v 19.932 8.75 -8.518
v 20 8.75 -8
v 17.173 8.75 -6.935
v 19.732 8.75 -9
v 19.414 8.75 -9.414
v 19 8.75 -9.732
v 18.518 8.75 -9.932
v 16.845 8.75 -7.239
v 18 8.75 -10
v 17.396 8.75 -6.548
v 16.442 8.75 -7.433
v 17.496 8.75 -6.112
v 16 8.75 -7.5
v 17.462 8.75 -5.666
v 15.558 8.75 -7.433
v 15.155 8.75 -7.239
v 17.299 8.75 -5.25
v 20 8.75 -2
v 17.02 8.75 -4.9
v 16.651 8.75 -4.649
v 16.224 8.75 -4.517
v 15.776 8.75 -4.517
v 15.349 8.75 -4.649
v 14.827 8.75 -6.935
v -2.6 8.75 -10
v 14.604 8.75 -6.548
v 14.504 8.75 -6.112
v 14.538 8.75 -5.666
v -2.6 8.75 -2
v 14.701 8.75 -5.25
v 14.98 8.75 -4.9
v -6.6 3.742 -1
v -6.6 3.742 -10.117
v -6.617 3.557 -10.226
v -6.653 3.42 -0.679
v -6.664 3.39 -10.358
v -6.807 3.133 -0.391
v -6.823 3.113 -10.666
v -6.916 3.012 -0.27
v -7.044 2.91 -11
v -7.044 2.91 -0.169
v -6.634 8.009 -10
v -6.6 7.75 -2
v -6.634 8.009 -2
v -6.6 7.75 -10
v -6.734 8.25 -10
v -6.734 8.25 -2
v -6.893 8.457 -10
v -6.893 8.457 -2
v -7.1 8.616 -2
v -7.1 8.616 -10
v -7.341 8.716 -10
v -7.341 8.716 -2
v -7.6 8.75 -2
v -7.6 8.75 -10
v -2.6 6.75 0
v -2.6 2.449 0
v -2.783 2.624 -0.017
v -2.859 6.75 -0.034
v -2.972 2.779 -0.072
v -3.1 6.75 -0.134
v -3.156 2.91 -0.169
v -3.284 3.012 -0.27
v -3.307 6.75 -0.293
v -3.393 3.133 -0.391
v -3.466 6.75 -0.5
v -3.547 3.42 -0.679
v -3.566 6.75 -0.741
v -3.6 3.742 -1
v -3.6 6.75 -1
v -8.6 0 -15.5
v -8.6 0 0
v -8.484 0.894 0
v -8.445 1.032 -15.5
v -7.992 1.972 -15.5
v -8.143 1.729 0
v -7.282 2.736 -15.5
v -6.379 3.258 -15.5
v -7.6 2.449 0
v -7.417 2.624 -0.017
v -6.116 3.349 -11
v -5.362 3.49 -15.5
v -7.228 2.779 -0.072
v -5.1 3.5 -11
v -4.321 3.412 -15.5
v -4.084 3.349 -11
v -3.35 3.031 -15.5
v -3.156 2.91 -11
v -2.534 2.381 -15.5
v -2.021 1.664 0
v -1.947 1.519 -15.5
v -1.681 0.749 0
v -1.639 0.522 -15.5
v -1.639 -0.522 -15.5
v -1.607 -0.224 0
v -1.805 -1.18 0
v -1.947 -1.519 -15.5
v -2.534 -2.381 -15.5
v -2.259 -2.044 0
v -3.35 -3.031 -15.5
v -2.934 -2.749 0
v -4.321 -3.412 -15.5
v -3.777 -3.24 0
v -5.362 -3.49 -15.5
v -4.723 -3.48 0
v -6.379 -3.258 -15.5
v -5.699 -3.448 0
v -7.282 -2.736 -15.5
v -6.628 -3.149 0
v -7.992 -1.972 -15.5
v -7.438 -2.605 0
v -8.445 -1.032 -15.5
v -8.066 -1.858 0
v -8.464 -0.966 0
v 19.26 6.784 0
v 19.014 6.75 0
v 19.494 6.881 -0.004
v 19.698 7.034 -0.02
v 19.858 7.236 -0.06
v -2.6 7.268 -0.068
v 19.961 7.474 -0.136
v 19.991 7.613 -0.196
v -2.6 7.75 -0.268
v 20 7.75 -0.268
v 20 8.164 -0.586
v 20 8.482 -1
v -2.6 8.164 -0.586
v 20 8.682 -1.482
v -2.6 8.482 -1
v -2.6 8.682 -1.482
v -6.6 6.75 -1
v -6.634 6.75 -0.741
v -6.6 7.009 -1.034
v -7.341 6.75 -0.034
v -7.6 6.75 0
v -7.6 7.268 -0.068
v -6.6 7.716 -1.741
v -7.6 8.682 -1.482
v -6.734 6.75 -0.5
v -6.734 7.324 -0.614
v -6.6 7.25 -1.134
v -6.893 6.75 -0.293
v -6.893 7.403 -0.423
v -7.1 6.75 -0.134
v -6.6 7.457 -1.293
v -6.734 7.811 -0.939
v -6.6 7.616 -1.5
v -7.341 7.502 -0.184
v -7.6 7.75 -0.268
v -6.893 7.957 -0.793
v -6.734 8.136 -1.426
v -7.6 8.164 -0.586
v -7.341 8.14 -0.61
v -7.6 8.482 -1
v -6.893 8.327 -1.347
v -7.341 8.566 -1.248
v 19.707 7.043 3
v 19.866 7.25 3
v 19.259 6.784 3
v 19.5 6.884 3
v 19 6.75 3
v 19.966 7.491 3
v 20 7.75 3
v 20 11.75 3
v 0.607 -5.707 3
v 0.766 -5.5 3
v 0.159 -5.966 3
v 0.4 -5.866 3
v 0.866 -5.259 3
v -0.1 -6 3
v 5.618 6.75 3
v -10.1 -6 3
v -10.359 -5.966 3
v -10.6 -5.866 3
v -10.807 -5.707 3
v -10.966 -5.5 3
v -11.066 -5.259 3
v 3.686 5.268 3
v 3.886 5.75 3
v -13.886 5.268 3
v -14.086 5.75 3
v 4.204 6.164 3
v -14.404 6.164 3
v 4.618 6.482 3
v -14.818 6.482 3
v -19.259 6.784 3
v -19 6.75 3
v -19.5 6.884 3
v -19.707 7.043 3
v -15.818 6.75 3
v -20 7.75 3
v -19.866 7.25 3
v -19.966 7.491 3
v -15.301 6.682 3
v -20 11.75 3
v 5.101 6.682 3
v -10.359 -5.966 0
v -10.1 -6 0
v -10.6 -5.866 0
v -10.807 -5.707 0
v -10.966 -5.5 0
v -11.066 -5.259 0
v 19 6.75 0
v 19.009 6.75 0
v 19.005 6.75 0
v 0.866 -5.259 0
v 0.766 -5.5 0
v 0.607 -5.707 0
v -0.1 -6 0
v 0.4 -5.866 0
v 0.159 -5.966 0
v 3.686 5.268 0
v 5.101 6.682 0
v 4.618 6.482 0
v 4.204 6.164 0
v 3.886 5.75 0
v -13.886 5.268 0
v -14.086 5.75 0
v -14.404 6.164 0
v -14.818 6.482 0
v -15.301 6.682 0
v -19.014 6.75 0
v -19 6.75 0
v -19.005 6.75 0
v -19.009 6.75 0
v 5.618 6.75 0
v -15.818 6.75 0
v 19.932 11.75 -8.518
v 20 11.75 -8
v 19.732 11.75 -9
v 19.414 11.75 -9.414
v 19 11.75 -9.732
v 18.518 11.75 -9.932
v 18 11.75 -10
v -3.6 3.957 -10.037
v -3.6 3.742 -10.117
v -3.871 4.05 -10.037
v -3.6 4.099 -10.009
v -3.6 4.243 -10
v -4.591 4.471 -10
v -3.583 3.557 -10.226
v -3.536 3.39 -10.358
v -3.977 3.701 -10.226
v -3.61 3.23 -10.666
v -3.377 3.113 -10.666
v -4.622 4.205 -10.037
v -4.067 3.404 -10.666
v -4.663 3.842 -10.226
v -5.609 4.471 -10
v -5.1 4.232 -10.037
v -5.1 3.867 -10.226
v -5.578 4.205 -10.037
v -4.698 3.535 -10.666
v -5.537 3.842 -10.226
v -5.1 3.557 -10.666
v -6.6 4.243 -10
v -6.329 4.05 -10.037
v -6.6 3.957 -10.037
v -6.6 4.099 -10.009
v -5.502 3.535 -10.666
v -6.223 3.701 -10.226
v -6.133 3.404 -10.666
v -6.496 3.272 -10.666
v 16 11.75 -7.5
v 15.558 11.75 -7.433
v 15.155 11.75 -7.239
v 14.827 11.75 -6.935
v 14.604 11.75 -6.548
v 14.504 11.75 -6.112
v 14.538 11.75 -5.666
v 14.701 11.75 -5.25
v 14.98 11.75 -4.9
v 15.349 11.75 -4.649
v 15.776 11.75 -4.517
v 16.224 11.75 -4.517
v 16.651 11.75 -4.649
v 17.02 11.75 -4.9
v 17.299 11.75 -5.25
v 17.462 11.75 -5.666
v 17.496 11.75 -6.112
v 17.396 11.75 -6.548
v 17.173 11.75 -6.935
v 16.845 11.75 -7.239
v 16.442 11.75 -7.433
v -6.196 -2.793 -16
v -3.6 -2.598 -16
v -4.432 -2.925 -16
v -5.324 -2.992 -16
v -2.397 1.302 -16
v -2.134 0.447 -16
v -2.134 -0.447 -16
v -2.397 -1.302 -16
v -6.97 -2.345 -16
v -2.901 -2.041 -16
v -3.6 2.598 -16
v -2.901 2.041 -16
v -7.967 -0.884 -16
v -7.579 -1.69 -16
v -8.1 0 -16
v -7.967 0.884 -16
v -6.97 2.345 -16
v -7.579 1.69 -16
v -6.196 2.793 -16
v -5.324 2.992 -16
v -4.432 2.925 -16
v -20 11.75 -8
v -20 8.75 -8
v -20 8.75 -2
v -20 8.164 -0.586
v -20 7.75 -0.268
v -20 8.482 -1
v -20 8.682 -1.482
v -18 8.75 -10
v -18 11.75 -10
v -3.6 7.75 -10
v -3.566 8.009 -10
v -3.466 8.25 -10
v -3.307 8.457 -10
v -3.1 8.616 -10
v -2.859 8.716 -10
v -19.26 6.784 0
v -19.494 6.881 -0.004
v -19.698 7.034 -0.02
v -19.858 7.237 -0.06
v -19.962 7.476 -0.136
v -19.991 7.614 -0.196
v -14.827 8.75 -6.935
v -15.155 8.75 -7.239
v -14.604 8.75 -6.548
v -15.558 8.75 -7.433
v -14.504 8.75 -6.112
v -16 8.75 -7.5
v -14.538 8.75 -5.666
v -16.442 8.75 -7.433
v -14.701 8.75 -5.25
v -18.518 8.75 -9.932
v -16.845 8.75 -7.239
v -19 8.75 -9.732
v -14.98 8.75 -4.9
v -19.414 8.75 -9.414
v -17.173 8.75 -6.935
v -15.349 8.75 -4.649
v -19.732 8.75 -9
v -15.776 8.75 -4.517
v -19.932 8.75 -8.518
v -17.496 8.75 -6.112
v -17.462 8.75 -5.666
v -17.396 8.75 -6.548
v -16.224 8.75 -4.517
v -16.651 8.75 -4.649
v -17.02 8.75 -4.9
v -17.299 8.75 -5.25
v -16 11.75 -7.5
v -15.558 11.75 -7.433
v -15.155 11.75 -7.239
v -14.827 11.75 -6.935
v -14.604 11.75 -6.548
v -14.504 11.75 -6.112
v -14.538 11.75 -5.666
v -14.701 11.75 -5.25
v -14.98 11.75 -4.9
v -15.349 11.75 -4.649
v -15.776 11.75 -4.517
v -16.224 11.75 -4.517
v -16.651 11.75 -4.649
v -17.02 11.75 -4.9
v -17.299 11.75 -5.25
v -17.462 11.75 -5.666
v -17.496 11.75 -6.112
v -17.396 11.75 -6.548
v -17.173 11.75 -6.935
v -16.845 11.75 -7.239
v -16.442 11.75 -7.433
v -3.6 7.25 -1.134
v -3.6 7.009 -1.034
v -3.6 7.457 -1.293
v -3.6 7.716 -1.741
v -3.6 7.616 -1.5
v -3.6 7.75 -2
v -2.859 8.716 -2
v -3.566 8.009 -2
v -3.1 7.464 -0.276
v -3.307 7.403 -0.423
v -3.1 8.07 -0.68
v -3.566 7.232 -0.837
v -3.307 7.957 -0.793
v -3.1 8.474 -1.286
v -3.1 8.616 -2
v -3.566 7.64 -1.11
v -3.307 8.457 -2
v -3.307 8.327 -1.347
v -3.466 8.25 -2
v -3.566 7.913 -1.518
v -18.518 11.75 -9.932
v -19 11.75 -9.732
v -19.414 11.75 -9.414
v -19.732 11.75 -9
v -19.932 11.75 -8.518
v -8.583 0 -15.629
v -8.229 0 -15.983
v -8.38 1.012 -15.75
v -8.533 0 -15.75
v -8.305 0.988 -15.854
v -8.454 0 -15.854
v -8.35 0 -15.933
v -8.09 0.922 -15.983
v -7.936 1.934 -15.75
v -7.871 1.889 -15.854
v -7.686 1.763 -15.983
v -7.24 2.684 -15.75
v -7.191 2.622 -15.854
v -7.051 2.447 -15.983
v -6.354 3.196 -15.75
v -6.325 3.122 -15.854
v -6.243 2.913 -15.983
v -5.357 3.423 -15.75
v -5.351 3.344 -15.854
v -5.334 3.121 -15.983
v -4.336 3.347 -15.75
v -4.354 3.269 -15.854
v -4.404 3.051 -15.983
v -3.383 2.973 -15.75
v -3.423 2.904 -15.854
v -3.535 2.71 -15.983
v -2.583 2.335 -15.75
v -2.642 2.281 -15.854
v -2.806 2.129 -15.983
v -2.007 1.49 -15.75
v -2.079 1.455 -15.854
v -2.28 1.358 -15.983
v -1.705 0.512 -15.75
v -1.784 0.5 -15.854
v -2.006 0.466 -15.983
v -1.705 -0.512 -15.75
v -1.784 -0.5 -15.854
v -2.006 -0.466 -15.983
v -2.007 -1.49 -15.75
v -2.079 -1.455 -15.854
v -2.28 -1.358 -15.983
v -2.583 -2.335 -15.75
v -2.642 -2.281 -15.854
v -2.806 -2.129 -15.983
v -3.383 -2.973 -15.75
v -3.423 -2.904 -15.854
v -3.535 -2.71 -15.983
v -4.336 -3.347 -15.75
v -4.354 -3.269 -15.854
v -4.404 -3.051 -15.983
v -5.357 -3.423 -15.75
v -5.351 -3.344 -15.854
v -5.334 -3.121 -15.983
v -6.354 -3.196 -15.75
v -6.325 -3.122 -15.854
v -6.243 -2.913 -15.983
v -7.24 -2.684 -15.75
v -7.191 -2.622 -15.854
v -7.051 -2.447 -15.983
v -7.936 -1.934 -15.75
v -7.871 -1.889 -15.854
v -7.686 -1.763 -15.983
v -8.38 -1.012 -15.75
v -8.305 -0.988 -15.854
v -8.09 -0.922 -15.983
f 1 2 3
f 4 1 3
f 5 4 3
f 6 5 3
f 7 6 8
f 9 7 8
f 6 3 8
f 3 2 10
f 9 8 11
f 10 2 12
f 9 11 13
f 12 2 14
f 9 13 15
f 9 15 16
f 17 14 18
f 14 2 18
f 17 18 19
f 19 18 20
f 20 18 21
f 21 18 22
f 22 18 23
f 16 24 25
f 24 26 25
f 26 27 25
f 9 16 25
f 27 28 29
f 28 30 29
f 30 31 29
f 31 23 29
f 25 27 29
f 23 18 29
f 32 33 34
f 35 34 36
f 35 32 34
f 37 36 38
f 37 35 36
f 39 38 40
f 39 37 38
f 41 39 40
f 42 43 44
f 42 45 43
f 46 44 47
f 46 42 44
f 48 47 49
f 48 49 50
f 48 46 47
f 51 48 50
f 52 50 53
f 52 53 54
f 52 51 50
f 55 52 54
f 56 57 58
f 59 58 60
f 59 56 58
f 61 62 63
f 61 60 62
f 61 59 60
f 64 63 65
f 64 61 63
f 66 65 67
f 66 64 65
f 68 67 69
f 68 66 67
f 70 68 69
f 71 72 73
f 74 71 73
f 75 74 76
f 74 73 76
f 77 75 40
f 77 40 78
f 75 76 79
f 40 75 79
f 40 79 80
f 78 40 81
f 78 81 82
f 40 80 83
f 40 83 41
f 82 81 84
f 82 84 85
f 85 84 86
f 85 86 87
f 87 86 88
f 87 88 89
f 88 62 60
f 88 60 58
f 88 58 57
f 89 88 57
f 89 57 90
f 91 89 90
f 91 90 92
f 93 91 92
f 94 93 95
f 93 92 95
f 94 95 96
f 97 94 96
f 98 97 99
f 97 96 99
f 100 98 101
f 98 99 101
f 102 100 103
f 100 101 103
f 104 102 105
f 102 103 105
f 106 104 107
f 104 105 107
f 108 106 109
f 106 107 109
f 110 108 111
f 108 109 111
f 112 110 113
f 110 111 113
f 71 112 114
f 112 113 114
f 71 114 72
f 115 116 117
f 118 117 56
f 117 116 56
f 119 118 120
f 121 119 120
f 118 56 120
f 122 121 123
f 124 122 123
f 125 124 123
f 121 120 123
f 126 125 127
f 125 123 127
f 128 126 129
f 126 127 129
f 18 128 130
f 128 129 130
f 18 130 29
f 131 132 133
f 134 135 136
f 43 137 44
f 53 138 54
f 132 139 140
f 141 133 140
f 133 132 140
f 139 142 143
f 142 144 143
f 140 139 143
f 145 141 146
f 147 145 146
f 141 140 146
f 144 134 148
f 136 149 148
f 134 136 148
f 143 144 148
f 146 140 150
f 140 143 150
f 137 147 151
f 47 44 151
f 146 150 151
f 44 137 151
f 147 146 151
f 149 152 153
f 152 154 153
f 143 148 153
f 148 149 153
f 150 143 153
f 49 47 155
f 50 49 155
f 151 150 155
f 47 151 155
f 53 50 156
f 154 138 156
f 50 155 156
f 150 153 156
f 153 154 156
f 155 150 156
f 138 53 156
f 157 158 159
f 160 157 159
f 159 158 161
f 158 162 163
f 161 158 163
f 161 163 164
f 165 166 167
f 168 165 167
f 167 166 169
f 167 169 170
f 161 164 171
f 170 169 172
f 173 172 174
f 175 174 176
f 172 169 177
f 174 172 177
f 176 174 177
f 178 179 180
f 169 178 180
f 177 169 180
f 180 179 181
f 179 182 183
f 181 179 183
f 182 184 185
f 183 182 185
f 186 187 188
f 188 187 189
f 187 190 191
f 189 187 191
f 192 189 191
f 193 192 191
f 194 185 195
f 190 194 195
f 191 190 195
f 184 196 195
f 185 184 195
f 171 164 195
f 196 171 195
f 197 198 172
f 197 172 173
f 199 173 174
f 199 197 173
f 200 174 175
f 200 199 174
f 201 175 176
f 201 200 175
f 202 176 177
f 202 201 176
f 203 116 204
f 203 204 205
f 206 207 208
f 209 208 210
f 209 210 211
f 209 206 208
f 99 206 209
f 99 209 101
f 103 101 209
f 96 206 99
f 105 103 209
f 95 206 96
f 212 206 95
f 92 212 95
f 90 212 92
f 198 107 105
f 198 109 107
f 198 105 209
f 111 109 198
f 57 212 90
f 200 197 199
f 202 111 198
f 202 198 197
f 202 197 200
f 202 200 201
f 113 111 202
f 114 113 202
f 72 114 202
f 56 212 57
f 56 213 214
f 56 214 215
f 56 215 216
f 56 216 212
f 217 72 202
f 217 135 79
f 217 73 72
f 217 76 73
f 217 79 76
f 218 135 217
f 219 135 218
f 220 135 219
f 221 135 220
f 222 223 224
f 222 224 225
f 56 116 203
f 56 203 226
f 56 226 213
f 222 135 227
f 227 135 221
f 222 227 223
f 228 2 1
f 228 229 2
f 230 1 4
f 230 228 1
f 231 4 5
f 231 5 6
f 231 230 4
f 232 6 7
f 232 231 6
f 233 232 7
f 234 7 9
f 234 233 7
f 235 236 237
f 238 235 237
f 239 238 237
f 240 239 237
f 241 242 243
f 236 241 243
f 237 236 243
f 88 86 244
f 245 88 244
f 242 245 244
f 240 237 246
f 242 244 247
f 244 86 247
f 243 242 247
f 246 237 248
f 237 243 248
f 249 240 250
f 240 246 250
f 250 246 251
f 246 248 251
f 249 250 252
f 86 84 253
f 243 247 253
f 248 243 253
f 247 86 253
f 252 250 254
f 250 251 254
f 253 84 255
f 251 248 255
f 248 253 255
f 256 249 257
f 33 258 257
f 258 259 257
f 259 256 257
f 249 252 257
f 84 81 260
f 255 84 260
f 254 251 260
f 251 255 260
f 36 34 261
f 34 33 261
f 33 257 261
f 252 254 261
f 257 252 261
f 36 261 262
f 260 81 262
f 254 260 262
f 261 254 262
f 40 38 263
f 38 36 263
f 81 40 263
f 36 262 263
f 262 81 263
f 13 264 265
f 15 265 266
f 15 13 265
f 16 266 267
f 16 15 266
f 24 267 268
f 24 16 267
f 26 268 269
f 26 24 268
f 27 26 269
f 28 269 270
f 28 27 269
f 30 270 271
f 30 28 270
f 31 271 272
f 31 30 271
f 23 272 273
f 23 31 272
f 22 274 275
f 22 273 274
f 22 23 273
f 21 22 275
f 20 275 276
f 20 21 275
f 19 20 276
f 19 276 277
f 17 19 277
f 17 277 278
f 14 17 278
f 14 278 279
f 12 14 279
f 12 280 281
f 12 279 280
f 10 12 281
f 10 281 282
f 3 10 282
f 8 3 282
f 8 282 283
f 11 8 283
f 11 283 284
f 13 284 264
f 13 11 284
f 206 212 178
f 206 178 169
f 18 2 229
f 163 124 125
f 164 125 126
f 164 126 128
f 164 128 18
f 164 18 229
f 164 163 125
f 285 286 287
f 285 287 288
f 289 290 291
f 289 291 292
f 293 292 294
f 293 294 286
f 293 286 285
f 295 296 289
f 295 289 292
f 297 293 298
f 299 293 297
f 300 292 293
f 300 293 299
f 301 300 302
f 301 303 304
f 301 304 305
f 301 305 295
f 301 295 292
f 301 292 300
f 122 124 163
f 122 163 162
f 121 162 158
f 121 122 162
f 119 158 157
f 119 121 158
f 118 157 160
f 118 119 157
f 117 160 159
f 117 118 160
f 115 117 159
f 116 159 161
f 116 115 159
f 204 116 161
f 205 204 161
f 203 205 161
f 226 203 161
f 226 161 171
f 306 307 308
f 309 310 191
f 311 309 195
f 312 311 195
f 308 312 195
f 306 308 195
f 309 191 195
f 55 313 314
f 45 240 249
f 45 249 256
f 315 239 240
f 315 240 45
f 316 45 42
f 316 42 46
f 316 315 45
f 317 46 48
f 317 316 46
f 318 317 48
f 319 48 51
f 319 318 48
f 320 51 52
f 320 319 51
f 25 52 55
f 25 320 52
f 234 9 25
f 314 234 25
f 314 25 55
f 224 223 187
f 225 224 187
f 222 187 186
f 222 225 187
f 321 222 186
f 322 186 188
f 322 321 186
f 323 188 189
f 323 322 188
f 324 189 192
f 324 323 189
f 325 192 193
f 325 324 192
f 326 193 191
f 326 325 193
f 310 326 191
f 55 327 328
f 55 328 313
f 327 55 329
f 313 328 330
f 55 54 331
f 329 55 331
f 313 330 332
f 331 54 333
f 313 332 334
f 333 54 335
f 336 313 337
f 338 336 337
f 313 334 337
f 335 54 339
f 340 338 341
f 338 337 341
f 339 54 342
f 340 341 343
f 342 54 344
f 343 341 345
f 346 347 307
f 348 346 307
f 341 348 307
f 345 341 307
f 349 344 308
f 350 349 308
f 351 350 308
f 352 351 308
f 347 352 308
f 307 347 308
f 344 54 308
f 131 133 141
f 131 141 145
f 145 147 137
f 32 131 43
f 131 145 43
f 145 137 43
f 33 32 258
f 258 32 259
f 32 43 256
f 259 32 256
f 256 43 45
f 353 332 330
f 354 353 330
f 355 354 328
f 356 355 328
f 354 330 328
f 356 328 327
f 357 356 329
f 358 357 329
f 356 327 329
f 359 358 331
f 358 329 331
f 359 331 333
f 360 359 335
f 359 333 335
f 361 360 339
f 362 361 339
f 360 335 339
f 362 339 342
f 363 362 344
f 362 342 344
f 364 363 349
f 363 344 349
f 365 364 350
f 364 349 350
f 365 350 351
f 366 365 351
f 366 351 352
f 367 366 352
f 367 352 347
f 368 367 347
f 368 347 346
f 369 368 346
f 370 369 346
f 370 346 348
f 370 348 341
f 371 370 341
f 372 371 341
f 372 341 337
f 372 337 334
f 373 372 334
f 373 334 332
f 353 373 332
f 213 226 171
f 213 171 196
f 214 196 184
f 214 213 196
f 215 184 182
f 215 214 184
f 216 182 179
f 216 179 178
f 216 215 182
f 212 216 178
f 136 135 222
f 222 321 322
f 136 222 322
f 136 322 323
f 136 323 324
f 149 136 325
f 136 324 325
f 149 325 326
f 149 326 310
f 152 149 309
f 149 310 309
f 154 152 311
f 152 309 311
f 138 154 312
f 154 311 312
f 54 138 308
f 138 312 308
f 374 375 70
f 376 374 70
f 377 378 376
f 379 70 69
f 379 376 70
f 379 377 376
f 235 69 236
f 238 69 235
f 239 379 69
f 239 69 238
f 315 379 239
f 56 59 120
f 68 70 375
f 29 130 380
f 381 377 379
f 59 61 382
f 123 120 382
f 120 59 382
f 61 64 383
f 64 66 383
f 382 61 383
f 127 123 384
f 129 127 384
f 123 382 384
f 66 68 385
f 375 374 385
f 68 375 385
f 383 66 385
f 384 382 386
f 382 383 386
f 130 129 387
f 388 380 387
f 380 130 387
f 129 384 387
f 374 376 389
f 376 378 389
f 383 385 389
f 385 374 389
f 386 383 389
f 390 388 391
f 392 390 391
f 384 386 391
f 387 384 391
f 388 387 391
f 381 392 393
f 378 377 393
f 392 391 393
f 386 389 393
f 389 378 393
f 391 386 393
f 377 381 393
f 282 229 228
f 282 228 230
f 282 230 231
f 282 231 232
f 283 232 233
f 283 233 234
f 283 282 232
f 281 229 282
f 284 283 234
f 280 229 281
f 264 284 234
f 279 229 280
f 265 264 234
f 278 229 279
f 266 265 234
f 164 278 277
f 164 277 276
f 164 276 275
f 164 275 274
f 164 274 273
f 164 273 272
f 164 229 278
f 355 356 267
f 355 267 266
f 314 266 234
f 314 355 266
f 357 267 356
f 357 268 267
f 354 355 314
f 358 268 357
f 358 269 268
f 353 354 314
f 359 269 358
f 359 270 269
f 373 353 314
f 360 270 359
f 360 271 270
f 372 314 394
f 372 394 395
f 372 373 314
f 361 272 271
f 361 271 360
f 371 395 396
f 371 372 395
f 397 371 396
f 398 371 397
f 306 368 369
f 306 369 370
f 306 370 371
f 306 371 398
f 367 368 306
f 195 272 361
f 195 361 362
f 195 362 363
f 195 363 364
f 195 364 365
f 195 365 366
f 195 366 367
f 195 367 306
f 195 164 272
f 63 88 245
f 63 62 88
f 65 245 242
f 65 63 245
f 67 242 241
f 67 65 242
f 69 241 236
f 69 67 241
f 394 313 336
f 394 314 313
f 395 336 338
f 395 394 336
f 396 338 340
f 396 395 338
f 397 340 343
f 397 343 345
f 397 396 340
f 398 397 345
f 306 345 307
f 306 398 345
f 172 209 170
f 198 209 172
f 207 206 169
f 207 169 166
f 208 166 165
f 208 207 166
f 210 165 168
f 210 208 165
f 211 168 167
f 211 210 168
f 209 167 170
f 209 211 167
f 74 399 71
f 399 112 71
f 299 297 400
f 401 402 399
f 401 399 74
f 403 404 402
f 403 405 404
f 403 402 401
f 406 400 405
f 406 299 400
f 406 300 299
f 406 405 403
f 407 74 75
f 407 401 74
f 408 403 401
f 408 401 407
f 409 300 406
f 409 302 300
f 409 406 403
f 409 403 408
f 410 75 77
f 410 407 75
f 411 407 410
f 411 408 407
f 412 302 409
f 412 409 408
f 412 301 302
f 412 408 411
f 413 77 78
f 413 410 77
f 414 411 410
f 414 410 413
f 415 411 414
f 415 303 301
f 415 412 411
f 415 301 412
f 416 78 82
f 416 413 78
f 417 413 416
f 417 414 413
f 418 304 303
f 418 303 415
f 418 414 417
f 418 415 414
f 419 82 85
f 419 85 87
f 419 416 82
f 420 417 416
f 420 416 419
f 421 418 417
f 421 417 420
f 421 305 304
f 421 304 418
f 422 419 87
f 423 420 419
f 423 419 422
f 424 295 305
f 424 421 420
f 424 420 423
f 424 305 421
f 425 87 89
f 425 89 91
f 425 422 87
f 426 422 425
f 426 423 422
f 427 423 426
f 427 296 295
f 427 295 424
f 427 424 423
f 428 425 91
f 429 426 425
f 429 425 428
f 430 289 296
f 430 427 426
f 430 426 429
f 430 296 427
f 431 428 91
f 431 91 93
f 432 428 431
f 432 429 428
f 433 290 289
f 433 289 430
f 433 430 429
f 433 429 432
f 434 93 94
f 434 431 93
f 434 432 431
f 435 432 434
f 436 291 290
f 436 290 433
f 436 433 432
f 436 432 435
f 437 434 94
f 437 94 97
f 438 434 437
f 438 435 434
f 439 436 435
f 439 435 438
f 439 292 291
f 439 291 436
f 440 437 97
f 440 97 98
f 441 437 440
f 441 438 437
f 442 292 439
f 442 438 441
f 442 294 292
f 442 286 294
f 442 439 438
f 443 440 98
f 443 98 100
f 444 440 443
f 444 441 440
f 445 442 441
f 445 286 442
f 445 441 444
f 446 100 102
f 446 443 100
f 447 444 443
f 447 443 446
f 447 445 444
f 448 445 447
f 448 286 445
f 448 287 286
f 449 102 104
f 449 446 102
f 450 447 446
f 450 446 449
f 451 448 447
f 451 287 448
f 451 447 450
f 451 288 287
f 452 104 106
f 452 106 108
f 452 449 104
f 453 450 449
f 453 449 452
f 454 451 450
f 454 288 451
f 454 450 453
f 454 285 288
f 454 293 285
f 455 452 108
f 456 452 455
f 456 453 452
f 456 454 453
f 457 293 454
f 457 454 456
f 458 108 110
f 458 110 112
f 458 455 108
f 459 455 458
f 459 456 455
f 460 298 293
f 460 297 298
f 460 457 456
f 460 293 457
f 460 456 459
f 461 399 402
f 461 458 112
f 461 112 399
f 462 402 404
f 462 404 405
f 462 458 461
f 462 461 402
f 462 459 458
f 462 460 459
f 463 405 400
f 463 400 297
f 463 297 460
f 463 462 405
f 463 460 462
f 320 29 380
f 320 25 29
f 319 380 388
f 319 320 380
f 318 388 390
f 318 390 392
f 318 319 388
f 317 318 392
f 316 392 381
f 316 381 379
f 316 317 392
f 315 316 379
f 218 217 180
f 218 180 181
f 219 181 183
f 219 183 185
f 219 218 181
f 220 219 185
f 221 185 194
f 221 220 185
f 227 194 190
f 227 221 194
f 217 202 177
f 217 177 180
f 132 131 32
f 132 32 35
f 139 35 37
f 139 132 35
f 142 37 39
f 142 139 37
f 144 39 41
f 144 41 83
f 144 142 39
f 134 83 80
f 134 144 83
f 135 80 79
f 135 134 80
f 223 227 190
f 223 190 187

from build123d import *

# Parameters (mm, degrees)
BOSS_EXTRUDE1_DEPTH = 3
SKETCH4_W           = 40
SKETCH4_H           = 3
BOSS_EXTRUDE2_DEPTH = 10
FILLET1_R           = 2
FILLET2_R           = 2
SKETCH5_R           = 1.5
CUT_EXTRUDE1_DEPTH  = 27.787357167
SKETCH6_R           = 3.5
BOSS_EXTRUDE3_DEPTH = 16
FILLET3_R           = 0.5
SKETCH7_W           = 10
SKETCH7_H           = 8.75
BOSS_EXTRUDE4_DEPTH = 1.5
FILLET4_R           = 1


with BuildPart() as part:
    # Sketch3 → Boss-Extrude1 (new body)
    with BuildSketch(Plane.XY):
        with BuildLine():
            Line((-0.1, -6), (-10.1, -6))
            ThreePointArc((-10.1, -6), (-10.708761429, -5.79335334), (-11.065925826, -5.258819045))
            Line((-11.065925826, -5.258819045), (-13.886481515, 5.26763809))
            ThreePointArc((-13.886481515, 5.26763809), (-14.600810309, 6.336706681), (-15.818333167, 6.75))
            Line((-15.818333167, 6.75), (-19, 6.75))
            ThreePointArc((-19, 6.75), (-19.707106781, 7.042893219), (-20, 7.75))
            Line((-20, 7.75), (-20, 11.75))
            Line((-20, 11.75), (20, 11.75))
            Line((20, 11.75), (20, 7.75))
            ThreePointArc((20, 7.75), (19.707106781, 7.042893219), (19, 6.75))
            Line((19, 6.75), (5.618333167, 6.75))
            ThreePointArc((5.618333167, 6.75), (4.400810309, 6.336706681), (3.686481515, 5.26763809))
            Line((3.686481515, 5.26763809), (0.865925826, -5.258819045))
            ThreePointArc((0.865925826, -5.258819045), (0.508761429, -5.79335334), (-0.1, -6))
        make_face()
    extrude(amount=BOSS_EXTRUDE1_DEPTH)

    # Sketch4 → Boss-Extrude2 (add)
    with BuildSketch(Plane(origin=(0, 0, 0), x_dir=(-1, 0, 0), z_dir=(0, 0, -1))):
        with Locations((0, 10.25)):
            Rectangle(SKETCH4_W, SKETCH4_H)
    extrude(amount=BOSS_EXTRUDE2_DEPTH)

    # Fillet1
    fillet1_edges = [part.edges().sort_by_distance(p)[0] for p in [
        (0, 8.75, 0),
    ]]
    fillet(fillet1_edges, radius=FILLET1_R - 0.0001)  # a hair under: the kernel refuses the full size

    # Fillet2
    fillet2_edges = [part.edges().sort_by_distance(p)[0] for p in [
        (20, 10.25, -10),
        (-20, 10.25, -10),
    ]]
    fillet(fillet2_edges, radius=FILLET2_R)

    # Sketch5 → Cut-Extrude1 (cut, through all)
    with BuildSketch(Plane.XZ.offset(-8.75)):
        with Locations(Location((-16, -6, 0), (0, 0, 270))):
            Circle(SKETCH5_R)
    cut_extrude1 = extrude(amount=-CUT_EXTRUDE1_DEPTH, mode=Mode.SUBTRACT)

    # Mirror1: Cut-Extrude1 across plane
    add(cut_extrude1.mirror(Plane(origin=(0, 0, 0), x_dir=(0, 0, 1), z_dir=(1, 0, 0))), mode=Mode.SUBTRACT)

    # Sketch6 → Boss-Extrude3 (add)
    with BuildSketch(Plane(origin=(0, 0, 0), x_dir=(-1, 0, 0), z_dir=(0, 0, -1))):
        with Locations((5.1, 0)):
            Circle(SKETCH6_R)
    extrude(amount=BOSS_EXTRUDE3_DEPTH)

    # Fillet3
    fillet3_edges = [part.edges().sort_by_distance(p)[0] for p in [
        (-1.6, 0, -16),
    ]]
    fillet(fillet3_edges, radius=FILLET3_R)

    # Sketch7 → Boss-Extrude4 (add, symmetric)
    with BuildSketch(Plane(origin=(-5.1, 0, 0), x_dir=(0, 0, -1), z_dir=(1, 0, 0))):
        with Locations((5, 4.375)):
            Rectangle(SKETCH7_W, SKETCH7_H)
    extrude(amount=BOSS_EXTRUDE4_DEPTH, both=True)

    # Fillet4
    fillet4_edges = [part.edges().sort_by_distance(p)[0] for p in [
        (-3.6, 8.164242852, -0.585757148),
        (-6.6, 4.95618883, 0),
        (-6.6, 8.164242852, -0.585757148),
        (-6.6, 8.75, -5.99995),
        (-3.6, 8.75, -5.99995),
        (-3.6, 4.95618883, 0),
        (-6.6, 3.16227766, -5),
        (-5.1, 3.5, -10),
        (-3.6, 3.16227766, -5),
    ]]
    fillet(fillet4_edges, radius=FILLET4_R)


solid = part.part
